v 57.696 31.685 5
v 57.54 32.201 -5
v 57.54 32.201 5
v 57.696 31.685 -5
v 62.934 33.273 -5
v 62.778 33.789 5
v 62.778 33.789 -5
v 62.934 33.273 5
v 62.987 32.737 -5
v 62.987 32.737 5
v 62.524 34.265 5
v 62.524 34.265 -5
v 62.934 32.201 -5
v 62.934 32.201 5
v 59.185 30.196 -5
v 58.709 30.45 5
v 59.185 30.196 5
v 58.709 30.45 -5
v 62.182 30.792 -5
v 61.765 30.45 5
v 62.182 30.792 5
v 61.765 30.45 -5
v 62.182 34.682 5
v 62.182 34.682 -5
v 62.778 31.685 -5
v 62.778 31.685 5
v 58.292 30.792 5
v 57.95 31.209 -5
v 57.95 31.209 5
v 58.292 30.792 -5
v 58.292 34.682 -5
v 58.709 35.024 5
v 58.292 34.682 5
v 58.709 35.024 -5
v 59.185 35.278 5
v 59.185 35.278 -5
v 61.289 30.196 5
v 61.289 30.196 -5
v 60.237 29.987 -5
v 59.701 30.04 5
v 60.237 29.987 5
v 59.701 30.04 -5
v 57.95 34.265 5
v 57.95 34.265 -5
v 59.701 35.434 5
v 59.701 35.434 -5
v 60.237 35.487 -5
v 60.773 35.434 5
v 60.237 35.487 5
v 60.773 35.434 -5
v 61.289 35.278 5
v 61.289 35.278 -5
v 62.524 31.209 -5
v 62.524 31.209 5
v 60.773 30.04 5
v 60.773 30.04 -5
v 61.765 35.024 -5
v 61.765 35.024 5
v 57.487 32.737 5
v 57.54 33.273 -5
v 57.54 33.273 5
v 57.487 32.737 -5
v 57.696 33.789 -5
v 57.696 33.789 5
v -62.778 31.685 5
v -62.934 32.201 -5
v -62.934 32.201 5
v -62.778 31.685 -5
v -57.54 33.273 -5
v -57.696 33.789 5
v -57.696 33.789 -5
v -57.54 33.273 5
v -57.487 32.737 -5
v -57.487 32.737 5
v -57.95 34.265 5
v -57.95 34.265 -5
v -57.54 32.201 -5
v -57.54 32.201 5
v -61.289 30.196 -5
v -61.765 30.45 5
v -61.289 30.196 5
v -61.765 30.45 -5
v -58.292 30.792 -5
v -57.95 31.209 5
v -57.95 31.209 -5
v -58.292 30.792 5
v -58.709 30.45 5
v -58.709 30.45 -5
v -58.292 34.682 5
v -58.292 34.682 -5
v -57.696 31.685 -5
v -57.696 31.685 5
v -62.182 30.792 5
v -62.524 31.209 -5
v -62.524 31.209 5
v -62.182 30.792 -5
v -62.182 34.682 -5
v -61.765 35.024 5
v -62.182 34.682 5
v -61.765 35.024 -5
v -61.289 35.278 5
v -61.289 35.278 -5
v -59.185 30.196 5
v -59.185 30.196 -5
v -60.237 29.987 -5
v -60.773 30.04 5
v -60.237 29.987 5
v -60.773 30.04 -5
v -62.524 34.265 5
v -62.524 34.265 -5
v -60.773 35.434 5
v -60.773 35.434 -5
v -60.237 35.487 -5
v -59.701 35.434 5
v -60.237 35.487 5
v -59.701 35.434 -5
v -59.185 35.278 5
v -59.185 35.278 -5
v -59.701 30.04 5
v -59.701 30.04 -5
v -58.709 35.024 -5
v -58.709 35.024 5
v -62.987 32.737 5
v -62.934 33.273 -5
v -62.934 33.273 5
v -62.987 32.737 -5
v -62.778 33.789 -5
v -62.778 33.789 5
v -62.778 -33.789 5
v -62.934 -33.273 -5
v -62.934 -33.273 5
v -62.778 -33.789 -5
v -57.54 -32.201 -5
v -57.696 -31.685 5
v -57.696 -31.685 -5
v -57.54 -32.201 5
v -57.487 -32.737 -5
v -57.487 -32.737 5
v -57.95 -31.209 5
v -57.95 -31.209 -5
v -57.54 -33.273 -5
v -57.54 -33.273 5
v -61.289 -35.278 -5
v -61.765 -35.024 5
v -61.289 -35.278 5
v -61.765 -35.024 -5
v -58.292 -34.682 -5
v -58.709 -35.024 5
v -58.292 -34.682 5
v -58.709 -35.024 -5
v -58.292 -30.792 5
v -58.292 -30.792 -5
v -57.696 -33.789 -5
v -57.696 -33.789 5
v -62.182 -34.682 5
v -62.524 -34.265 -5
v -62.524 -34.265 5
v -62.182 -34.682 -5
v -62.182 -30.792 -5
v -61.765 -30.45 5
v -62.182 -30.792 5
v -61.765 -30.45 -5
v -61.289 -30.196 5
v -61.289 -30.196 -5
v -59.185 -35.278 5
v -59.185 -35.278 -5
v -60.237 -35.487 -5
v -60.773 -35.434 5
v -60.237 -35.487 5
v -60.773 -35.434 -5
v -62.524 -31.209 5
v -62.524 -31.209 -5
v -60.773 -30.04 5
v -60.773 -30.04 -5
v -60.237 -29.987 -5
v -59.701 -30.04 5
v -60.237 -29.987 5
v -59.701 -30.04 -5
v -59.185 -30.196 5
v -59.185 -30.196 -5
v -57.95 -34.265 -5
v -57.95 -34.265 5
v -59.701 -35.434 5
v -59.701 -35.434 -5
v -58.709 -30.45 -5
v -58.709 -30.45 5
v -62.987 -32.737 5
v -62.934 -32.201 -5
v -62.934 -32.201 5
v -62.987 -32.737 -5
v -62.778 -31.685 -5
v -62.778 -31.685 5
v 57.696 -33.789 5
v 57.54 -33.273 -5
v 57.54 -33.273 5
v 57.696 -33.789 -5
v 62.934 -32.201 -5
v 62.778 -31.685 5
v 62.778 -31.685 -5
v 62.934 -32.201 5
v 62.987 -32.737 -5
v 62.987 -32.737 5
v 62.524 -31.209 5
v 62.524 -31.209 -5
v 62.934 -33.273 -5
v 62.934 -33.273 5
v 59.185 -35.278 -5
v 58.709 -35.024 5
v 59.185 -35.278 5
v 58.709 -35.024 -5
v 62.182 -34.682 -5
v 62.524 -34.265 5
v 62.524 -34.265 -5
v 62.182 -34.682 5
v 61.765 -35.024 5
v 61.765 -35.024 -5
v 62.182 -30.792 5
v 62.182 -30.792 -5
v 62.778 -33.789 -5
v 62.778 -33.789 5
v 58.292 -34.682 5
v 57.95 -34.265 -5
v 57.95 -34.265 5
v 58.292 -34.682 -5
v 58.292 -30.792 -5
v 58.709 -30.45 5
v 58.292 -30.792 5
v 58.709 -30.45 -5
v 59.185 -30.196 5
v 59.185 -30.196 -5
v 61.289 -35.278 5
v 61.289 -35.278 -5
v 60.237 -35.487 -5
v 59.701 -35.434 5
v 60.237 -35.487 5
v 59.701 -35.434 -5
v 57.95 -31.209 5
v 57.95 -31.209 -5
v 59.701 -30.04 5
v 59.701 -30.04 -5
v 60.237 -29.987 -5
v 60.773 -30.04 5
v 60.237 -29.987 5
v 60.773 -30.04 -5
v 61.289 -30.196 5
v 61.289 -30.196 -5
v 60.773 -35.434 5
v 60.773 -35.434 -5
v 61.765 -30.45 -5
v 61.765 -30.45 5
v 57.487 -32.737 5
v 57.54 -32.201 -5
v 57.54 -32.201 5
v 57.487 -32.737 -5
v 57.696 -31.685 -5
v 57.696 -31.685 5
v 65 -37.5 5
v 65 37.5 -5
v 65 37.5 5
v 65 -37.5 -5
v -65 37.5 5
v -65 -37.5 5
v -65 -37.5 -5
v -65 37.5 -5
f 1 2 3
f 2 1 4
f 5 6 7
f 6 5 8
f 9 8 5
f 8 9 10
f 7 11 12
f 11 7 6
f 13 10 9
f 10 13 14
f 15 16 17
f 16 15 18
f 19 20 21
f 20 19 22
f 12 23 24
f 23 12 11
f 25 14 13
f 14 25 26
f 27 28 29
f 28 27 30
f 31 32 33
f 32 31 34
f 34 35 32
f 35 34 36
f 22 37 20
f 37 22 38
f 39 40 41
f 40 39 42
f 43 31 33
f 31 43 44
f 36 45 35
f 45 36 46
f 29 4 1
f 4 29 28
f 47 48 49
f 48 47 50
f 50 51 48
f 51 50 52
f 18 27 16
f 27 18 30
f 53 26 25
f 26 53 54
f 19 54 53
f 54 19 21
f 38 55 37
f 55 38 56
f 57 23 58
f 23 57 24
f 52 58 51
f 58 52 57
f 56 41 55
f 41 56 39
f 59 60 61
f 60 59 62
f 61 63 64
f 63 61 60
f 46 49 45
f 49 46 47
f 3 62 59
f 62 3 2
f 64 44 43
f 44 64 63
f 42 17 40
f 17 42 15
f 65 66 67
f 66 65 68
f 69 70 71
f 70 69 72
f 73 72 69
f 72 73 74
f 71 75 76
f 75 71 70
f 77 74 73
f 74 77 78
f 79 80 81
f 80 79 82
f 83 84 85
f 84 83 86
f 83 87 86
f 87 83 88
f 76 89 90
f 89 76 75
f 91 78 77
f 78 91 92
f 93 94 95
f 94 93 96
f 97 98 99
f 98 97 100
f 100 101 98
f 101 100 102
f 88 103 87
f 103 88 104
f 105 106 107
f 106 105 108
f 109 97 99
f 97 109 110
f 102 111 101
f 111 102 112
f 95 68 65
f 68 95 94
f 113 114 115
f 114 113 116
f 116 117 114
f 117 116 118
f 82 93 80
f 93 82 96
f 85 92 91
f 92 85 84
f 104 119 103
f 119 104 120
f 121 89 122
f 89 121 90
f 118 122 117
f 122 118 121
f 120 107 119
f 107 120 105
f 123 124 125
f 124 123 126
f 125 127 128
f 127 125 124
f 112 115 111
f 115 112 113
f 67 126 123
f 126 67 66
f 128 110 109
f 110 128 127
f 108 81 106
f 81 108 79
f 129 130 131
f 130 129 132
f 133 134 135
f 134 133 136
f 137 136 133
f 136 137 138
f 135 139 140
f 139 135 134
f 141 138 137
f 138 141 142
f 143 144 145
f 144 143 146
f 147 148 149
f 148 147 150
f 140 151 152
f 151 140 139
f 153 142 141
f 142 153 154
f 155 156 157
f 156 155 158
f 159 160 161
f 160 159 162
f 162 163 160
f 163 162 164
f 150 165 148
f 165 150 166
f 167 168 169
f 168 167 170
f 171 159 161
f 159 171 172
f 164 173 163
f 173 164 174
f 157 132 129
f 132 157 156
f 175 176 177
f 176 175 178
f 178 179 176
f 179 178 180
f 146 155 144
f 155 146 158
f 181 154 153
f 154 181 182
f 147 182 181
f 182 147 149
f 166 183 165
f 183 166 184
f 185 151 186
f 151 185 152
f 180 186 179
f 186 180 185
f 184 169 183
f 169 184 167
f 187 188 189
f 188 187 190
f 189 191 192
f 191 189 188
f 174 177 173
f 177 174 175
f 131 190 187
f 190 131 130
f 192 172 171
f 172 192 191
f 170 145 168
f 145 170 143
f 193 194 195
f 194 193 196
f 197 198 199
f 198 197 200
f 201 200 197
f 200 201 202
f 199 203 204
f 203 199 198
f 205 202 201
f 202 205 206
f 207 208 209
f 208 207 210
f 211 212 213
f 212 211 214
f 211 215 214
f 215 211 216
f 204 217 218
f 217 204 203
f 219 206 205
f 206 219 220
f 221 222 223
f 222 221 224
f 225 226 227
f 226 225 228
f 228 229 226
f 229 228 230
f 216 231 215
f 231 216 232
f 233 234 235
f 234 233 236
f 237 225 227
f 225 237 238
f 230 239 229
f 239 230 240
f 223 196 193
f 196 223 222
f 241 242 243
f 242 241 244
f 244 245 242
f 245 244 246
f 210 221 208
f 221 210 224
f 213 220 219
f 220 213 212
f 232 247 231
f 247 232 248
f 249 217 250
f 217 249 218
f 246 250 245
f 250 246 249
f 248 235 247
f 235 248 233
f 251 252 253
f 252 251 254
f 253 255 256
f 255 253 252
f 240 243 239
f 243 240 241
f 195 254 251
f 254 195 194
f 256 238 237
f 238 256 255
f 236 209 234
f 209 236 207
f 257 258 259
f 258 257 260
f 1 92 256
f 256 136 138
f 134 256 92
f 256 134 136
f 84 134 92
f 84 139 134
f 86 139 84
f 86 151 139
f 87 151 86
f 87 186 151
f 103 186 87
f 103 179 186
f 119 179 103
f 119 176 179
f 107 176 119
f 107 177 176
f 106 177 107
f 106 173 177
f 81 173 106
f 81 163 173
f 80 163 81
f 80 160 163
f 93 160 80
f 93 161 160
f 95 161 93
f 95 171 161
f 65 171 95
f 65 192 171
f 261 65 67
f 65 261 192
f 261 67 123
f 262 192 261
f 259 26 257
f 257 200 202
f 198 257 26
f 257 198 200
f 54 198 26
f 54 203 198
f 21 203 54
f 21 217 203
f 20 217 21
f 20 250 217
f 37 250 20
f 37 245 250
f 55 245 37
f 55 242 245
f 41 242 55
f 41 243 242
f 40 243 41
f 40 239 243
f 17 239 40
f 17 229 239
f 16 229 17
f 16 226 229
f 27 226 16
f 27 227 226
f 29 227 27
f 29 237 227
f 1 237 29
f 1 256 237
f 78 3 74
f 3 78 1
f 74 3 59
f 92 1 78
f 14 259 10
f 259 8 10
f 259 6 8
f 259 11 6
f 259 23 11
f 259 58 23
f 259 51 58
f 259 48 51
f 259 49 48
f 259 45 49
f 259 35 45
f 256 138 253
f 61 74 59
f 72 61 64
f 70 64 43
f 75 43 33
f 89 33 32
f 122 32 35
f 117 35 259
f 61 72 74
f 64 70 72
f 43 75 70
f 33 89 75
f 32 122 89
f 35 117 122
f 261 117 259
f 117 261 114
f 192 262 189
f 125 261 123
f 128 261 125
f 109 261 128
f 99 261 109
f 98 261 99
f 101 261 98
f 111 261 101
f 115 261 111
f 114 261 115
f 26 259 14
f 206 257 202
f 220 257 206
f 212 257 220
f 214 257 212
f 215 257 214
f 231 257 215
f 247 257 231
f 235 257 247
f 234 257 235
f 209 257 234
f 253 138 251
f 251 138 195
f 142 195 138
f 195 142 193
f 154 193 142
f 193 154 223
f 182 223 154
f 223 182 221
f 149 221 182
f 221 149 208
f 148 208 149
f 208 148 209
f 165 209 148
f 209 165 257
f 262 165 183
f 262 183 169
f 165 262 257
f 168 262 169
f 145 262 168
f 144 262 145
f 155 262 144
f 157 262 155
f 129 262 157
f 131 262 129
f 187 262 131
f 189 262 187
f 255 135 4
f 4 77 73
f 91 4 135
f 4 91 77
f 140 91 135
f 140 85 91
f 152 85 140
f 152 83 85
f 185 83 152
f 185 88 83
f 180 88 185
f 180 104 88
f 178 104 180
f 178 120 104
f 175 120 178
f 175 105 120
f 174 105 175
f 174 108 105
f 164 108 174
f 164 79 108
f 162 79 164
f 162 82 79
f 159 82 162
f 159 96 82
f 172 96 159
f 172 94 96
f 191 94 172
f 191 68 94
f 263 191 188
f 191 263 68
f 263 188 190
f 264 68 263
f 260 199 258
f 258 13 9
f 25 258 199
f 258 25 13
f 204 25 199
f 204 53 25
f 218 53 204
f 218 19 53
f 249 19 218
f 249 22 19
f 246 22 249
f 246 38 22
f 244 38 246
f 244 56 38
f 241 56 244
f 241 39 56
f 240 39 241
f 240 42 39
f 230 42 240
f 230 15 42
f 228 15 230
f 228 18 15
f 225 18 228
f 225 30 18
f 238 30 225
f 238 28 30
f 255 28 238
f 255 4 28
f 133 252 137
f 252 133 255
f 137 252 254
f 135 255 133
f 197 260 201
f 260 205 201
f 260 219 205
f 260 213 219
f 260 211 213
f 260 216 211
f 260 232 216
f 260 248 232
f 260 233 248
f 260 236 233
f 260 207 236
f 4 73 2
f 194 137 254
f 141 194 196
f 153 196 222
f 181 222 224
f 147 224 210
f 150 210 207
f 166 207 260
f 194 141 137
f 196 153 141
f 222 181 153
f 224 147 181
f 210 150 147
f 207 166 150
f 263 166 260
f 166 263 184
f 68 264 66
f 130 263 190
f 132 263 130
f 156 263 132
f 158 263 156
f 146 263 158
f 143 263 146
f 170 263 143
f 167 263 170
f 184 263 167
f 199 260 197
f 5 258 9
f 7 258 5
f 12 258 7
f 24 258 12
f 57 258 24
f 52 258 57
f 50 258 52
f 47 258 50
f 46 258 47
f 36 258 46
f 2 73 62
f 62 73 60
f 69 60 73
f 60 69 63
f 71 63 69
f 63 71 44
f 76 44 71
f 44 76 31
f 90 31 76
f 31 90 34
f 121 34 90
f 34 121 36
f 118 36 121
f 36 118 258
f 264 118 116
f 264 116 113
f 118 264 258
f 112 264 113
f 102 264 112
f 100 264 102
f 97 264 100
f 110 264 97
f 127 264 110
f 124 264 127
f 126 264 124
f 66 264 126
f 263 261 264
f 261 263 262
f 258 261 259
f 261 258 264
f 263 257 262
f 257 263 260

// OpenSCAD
$fn = 32;

// ----------------------------------------------------------------------
// Corner plate 130 x 75 x 10
// 4 holes, centres taken from the edge offset
// ----------------------------------------------------------------------

// --- parameters (mm) ---
plate = [130, 75, 10];  // overall size (x, y, z)
holes = 4;              // number of holes the drawing asks for
hole_d = 5.5;           // hole diameter
edge = 4.763;           // hole centre offset from the plate edge

// --- derived feature positions (mm) ---
corner_x = plate[0] / 2 - edge;  // = 60.24   corner hole X
corner_y = plate[1] / 2 - edge;  // = 32.74   corner hole Y
feature_centers = [
  [corner_x, corner_y],
  [-corner_x, corner_y],
  [-corner_x, -corner_y],
  [corner_x, -corner_y]
];   // hole centres the loop below drills

// plate outline, every hole drilled through with the same cutters
difference() {
  cube(plate, center = true);
  for (centre = feature_centers)
    translate([centre[0], centre[1], 0])
      cylinder(d = hole_d, h = plate[2] + 2, center = true);
}
